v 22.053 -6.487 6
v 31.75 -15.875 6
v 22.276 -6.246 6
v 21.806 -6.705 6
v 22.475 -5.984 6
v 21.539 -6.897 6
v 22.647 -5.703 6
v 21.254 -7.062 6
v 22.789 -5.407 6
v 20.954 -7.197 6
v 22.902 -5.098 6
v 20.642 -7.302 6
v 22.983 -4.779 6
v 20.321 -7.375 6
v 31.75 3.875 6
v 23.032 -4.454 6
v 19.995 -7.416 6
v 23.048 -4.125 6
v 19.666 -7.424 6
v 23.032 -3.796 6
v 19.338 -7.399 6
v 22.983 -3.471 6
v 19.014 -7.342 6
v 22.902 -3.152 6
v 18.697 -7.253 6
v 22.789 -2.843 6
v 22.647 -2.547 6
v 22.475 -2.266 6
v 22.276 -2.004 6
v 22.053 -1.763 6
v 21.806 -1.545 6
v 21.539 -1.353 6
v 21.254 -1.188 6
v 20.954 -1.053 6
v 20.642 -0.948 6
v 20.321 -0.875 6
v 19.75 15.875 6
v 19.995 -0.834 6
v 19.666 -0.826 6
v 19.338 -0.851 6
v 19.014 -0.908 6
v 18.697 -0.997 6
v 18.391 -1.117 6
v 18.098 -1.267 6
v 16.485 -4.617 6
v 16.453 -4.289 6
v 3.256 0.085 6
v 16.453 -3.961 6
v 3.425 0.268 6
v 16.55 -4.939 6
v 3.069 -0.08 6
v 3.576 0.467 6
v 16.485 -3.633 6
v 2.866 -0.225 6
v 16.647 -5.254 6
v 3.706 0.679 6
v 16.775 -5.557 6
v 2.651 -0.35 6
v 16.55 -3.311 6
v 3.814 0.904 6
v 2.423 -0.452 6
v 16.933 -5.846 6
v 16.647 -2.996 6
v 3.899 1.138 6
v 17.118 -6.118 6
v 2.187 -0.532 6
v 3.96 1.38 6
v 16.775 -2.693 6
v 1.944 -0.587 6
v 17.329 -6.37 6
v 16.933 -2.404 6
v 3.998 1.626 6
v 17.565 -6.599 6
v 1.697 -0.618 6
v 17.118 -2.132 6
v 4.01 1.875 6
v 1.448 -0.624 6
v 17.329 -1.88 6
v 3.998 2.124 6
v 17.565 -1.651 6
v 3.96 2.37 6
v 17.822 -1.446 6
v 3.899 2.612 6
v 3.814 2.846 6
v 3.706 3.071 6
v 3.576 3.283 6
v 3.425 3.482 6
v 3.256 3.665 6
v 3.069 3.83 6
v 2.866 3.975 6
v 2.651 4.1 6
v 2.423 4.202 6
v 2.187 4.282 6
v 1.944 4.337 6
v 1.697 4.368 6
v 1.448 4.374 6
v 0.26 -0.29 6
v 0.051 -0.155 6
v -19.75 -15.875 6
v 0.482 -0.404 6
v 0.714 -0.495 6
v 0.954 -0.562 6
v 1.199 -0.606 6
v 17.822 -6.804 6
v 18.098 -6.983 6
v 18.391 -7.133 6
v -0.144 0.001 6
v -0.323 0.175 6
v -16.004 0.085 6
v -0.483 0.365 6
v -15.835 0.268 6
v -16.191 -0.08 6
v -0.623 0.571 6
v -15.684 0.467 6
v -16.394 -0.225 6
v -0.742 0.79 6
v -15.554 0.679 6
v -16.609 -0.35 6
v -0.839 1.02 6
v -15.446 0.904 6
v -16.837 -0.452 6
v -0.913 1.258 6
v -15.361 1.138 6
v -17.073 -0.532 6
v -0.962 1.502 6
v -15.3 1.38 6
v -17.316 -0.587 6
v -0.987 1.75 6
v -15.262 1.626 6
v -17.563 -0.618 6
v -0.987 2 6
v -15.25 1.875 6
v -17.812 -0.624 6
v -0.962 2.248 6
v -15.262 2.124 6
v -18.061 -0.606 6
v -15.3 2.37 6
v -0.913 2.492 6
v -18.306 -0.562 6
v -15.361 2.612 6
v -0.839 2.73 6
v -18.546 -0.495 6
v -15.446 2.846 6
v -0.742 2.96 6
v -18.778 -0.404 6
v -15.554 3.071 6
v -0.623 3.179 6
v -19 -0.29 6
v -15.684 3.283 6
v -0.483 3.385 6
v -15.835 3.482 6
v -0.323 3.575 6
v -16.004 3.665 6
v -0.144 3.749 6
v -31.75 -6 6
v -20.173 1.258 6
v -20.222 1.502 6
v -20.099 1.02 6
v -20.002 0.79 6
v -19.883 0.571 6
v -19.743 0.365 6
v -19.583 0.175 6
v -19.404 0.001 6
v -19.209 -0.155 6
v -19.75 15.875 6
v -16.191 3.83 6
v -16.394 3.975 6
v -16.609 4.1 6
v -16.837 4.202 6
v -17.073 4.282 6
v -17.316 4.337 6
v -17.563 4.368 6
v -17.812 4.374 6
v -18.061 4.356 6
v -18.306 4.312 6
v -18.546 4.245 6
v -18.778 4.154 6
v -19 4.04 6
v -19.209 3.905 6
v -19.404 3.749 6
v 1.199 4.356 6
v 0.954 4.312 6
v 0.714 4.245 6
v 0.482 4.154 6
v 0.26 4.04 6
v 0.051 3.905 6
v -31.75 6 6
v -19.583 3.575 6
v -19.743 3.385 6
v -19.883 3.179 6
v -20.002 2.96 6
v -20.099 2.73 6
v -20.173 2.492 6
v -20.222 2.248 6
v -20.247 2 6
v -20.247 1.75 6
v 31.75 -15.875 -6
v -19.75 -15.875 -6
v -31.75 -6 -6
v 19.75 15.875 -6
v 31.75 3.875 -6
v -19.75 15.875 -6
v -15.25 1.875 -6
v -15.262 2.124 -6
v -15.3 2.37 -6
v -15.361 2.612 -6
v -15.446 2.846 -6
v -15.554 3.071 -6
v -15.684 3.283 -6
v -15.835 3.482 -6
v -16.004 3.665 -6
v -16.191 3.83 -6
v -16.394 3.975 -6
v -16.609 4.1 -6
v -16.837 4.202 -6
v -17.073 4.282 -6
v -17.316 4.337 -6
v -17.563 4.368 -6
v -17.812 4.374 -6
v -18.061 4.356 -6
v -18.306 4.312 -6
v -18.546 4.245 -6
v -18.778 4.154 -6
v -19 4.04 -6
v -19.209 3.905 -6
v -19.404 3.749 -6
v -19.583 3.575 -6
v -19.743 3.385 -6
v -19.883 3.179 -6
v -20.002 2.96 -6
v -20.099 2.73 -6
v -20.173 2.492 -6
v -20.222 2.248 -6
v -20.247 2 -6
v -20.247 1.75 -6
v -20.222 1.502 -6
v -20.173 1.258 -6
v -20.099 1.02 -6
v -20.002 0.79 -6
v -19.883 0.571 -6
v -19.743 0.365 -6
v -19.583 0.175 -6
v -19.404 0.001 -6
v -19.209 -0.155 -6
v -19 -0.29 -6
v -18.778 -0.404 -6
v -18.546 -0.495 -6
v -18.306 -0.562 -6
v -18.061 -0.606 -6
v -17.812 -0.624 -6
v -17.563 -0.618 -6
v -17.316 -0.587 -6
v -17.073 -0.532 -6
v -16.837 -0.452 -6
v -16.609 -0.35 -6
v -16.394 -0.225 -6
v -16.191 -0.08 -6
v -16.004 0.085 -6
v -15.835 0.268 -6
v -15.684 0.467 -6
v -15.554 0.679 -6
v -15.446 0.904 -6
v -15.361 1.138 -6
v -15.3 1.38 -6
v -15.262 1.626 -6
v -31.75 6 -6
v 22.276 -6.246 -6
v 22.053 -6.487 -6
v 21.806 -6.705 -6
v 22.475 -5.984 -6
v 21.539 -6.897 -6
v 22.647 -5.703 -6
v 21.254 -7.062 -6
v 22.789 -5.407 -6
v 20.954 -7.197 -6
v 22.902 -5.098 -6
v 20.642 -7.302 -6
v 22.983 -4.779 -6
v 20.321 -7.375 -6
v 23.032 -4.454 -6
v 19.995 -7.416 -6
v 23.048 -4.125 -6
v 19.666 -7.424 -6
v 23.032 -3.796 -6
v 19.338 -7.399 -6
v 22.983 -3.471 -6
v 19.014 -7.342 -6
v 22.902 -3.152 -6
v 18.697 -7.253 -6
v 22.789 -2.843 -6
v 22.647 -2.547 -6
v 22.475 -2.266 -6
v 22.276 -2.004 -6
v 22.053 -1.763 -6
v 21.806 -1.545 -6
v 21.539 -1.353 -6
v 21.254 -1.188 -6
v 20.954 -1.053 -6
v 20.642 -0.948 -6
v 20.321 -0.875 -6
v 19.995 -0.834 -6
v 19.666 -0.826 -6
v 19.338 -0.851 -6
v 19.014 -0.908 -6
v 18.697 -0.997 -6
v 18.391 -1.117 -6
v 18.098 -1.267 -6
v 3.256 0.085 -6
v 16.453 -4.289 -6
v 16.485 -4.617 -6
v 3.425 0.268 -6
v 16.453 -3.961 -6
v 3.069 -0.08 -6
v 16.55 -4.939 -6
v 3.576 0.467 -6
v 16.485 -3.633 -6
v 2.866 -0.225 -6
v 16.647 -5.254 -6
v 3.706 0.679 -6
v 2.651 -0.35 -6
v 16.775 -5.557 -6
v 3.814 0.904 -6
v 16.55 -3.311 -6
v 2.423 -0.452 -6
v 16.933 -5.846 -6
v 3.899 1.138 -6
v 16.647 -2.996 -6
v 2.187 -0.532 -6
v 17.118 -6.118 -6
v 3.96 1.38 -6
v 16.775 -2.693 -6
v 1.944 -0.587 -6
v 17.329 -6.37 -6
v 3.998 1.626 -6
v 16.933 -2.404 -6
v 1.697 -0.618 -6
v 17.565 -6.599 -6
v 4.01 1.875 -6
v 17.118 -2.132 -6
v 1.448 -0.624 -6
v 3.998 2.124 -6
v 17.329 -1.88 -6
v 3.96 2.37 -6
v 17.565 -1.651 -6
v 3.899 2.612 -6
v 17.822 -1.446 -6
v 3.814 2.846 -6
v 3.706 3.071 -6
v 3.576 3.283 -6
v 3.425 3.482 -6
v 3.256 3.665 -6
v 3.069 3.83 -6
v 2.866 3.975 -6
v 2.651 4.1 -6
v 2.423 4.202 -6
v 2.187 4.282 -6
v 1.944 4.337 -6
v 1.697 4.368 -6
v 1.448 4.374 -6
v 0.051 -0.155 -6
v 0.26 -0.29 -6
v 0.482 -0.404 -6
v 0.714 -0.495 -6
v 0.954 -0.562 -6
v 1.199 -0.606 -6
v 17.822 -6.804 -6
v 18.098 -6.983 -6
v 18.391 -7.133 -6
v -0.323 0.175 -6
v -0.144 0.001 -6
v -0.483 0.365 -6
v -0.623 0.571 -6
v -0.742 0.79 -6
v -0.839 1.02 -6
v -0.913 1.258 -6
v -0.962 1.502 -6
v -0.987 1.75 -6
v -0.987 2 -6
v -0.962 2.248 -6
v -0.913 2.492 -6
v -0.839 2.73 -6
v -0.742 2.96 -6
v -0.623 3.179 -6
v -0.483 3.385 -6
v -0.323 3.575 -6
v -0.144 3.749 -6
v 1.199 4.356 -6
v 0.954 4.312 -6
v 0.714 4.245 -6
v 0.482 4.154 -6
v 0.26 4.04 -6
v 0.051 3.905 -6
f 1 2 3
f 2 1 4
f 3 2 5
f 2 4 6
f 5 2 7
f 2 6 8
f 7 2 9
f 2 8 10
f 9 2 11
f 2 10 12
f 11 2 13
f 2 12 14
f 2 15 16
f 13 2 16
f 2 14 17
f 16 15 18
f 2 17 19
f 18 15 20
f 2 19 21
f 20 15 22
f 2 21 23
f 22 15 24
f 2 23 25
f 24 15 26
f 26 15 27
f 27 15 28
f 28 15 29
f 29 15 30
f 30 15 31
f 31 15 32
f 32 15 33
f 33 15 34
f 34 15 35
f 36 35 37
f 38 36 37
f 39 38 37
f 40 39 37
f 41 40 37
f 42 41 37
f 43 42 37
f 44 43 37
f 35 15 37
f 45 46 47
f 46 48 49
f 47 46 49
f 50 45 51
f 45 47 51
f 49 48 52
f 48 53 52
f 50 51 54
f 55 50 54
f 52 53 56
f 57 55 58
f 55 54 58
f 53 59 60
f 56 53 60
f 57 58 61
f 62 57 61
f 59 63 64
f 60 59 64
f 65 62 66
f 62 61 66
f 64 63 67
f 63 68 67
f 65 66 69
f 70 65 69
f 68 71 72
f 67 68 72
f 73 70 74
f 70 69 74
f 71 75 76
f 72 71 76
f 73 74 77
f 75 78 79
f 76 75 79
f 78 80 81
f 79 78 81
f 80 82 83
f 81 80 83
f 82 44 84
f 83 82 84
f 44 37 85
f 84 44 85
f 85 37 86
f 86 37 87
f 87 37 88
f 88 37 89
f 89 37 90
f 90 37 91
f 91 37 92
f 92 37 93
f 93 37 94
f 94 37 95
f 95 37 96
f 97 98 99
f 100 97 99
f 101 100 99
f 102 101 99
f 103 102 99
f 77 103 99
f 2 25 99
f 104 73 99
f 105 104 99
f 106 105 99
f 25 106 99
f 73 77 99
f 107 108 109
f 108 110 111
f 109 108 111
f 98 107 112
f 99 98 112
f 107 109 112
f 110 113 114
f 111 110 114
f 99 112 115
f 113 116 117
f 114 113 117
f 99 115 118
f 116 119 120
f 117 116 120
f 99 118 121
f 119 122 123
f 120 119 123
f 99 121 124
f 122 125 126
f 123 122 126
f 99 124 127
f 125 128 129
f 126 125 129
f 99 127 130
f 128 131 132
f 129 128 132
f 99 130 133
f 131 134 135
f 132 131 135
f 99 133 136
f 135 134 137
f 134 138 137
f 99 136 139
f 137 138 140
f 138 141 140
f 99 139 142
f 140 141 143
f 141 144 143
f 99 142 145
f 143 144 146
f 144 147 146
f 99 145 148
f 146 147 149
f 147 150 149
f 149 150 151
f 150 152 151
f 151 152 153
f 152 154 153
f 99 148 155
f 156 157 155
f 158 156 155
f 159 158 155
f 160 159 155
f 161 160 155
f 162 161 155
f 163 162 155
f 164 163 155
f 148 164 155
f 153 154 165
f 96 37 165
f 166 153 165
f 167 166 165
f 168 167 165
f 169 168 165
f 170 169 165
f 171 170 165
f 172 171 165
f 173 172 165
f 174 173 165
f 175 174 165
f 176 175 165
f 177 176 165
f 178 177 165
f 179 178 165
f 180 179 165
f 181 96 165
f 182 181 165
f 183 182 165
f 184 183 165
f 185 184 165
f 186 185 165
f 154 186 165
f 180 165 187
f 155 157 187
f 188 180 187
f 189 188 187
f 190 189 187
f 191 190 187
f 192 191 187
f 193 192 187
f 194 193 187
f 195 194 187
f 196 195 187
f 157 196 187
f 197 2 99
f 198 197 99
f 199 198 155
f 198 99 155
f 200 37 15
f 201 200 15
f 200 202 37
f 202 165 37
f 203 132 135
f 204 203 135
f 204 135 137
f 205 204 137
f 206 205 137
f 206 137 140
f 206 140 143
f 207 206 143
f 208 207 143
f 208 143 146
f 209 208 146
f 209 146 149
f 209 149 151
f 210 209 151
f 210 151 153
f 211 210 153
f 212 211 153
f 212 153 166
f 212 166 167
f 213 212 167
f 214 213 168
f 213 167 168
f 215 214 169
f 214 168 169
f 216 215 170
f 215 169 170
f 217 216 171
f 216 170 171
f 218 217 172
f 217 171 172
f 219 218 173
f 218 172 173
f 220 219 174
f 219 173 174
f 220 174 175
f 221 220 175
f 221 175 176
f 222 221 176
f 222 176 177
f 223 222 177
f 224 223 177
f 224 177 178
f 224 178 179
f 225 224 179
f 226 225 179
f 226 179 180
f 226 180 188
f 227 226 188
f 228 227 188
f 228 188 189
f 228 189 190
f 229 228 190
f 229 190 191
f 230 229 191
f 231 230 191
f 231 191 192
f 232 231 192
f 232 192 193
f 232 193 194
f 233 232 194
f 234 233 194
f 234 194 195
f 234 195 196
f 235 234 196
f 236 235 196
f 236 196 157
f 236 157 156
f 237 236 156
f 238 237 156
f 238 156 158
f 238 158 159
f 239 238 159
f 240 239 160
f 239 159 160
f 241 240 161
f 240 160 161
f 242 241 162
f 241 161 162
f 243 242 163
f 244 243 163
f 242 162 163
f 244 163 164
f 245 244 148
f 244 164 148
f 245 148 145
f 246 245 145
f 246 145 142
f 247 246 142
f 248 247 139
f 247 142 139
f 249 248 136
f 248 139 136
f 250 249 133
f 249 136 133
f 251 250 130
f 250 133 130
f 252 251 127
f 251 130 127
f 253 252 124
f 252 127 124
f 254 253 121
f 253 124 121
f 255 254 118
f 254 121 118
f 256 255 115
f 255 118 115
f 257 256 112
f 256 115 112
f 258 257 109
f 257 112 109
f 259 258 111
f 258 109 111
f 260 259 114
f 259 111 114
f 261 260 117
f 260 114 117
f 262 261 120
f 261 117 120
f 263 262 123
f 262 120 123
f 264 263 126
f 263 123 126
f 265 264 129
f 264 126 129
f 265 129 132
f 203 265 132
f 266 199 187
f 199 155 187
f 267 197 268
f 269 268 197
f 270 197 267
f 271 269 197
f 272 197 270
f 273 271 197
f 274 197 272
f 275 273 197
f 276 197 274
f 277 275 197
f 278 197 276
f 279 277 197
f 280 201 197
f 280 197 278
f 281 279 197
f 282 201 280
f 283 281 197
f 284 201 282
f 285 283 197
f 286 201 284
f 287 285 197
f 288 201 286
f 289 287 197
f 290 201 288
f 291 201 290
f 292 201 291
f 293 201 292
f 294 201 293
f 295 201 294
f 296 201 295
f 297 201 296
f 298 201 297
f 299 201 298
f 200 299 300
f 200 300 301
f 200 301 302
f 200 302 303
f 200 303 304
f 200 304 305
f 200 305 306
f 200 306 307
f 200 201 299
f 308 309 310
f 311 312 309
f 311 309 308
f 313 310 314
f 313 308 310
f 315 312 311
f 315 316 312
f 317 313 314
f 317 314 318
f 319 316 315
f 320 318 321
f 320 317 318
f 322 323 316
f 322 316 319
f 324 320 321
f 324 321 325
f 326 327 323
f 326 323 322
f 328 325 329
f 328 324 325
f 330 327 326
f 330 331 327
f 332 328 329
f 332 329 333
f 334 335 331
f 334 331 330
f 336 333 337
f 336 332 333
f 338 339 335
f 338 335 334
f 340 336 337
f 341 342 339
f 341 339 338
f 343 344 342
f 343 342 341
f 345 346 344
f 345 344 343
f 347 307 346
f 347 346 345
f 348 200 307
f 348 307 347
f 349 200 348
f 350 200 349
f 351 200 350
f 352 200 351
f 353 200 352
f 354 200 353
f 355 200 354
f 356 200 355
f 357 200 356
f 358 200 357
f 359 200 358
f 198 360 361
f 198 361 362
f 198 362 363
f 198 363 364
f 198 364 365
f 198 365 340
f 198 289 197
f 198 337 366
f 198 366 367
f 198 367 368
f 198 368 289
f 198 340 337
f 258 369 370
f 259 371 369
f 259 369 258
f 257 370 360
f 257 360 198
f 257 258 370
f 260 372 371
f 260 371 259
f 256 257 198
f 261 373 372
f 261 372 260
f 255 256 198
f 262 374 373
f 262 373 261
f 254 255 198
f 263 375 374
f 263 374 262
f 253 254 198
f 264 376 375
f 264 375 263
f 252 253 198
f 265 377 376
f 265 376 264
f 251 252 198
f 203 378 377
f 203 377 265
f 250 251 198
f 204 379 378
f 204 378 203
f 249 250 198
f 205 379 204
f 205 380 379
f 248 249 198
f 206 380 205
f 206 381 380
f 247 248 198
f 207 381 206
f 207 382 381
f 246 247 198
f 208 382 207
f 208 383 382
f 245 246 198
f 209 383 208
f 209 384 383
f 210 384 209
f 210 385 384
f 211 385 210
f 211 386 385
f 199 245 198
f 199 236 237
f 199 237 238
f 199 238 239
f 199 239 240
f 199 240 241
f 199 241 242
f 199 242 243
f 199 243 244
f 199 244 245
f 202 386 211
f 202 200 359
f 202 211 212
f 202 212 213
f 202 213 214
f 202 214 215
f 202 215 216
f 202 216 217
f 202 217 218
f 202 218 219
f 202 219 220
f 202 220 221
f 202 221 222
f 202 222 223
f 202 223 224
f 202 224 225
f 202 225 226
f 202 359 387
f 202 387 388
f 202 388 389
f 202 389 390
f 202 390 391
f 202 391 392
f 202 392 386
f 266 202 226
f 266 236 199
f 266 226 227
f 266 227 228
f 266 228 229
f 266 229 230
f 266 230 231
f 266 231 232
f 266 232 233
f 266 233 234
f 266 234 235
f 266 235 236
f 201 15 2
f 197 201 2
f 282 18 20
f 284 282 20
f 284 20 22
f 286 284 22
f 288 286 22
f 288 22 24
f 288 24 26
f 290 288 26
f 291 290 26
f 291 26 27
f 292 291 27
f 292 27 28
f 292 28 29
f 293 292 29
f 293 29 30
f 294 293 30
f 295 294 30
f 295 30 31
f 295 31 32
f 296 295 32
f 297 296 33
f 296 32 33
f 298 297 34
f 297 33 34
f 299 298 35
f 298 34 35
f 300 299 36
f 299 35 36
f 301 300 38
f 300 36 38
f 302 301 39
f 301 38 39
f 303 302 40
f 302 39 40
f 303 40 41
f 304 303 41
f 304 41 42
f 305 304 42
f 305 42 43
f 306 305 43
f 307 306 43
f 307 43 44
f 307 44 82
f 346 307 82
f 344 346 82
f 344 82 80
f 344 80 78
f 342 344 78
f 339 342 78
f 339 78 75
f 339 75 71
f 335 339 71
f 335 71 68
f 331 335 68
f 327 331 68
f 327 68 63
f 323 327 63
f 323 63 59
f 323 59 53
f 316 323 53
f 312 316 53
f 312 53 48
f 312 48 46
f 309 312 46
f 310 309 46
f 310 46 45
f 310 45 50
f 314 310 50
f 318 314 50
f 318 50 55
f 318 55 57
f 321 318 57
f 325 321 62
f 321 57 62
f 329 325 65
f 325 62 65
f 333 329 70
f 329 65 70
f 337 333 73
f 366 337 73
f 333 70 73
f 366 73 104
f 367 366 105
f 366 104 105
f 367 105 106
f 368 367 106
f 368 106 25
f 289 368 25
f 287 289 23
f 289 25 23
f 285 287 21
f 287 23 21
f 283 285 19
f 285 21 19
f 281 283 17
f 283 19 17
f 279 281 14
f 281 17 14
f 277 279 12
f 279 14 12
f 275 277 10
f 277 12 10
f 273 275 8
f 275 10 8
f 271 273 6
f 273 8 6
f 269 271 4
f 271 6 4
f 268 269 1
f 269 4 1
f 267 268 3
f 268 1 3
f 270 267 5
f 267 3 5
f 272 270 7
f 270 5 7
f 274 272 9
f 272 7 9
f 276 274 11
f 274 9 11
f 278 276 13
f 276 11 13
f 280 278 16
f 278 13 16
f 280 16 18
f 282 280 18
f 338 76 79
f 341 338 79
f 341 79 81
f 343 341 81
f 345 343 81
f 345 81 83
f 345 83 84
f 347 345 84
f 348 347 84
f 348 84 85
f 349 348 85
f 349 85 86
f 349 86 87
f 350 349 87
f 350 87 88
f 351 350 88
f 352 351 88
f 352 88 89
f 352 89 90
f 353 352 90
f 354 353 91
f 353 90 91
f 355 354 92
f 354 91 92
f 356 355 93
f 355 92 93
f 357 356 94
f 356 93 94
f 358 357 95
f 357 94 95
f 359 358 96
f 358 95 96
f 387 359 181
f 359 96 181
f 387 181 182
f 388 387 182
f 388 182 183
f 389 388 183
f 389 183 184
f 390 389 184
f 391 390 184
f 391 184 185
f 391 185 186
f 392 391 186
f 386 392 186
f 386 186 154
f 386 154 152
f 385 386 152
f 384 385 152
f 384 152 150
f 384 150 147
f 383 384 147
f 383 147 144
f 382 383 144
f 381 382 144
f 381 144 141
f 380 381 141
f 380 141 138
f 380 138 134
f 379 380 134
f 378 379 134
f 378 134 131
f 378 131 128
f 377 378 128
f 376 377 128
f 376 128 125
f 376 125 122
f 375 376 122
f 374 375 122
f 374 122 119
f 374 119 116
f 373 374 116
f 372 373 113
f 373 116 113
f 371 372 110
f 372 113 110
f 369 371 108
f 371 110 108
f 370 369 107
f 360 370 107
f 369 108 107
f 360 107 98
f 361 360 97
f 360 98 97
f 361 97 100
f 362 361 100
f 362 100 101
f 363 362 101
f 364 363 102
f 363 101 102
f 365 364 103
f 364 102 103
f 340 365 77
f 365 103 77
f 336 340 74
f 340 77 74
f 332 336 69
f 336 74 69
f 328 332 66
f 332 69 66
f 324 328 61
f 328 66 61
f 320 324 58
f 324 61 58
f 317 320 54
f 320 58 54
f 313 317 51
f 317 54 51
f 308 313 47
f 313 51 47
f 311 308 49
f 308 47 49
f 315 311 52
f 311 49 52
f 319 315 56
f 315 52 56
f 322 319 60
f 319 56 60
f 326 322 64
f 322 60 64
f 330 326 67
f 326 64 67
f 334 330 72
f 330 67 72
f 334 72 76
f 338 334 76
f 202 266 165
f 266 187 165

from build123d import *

# Parameters (mm, degrees)
BOSS_EXTRUDE1_DEPTH   = 6
M6X1_0_TAPPED_HOLE1_D = 5
M6_CLEARANCE_HOLE1_D  = 6.6


with BuildPart() as part:
    # Sketch2 → Boss-Extrude1 (new, symmetric)
    with BuildSketch(Plane.XY):
        Polygon((31.75, -15.875), (-19.75, -15.875), (-31.75, -6), (-31.75, 6), (-19.75, 15.875), (19.75, 15.875), (31.75, 3.875), align=None)
    extrude(amount=BOSS_EXTRUDE1_DEPTH, both=True)

    # M6x1.0 Tapped Hole1 (through all)
    with Locations(Plane(origin=(0, 0, -6), x_dir=(-1, 0, 0), z_dir=(0, 0, -1))):
        with Locations((17.75, 1.875), (-1.51, 1.875)):
            Hole(M6X1_0_TAPPED_HOLE1_D / 2)

    # M6 Clearance Hole1 (through all)
    with Locations(Plane(origin=(0, 0, -6), x_dir=(-1, 0, 0), z_dir=(0, 0, -1))):
        with Locations((-19.74843928, -4.125)):
            Hole(M6_CLEARANCE_HOLE1_D / 2)


solid = part.part
